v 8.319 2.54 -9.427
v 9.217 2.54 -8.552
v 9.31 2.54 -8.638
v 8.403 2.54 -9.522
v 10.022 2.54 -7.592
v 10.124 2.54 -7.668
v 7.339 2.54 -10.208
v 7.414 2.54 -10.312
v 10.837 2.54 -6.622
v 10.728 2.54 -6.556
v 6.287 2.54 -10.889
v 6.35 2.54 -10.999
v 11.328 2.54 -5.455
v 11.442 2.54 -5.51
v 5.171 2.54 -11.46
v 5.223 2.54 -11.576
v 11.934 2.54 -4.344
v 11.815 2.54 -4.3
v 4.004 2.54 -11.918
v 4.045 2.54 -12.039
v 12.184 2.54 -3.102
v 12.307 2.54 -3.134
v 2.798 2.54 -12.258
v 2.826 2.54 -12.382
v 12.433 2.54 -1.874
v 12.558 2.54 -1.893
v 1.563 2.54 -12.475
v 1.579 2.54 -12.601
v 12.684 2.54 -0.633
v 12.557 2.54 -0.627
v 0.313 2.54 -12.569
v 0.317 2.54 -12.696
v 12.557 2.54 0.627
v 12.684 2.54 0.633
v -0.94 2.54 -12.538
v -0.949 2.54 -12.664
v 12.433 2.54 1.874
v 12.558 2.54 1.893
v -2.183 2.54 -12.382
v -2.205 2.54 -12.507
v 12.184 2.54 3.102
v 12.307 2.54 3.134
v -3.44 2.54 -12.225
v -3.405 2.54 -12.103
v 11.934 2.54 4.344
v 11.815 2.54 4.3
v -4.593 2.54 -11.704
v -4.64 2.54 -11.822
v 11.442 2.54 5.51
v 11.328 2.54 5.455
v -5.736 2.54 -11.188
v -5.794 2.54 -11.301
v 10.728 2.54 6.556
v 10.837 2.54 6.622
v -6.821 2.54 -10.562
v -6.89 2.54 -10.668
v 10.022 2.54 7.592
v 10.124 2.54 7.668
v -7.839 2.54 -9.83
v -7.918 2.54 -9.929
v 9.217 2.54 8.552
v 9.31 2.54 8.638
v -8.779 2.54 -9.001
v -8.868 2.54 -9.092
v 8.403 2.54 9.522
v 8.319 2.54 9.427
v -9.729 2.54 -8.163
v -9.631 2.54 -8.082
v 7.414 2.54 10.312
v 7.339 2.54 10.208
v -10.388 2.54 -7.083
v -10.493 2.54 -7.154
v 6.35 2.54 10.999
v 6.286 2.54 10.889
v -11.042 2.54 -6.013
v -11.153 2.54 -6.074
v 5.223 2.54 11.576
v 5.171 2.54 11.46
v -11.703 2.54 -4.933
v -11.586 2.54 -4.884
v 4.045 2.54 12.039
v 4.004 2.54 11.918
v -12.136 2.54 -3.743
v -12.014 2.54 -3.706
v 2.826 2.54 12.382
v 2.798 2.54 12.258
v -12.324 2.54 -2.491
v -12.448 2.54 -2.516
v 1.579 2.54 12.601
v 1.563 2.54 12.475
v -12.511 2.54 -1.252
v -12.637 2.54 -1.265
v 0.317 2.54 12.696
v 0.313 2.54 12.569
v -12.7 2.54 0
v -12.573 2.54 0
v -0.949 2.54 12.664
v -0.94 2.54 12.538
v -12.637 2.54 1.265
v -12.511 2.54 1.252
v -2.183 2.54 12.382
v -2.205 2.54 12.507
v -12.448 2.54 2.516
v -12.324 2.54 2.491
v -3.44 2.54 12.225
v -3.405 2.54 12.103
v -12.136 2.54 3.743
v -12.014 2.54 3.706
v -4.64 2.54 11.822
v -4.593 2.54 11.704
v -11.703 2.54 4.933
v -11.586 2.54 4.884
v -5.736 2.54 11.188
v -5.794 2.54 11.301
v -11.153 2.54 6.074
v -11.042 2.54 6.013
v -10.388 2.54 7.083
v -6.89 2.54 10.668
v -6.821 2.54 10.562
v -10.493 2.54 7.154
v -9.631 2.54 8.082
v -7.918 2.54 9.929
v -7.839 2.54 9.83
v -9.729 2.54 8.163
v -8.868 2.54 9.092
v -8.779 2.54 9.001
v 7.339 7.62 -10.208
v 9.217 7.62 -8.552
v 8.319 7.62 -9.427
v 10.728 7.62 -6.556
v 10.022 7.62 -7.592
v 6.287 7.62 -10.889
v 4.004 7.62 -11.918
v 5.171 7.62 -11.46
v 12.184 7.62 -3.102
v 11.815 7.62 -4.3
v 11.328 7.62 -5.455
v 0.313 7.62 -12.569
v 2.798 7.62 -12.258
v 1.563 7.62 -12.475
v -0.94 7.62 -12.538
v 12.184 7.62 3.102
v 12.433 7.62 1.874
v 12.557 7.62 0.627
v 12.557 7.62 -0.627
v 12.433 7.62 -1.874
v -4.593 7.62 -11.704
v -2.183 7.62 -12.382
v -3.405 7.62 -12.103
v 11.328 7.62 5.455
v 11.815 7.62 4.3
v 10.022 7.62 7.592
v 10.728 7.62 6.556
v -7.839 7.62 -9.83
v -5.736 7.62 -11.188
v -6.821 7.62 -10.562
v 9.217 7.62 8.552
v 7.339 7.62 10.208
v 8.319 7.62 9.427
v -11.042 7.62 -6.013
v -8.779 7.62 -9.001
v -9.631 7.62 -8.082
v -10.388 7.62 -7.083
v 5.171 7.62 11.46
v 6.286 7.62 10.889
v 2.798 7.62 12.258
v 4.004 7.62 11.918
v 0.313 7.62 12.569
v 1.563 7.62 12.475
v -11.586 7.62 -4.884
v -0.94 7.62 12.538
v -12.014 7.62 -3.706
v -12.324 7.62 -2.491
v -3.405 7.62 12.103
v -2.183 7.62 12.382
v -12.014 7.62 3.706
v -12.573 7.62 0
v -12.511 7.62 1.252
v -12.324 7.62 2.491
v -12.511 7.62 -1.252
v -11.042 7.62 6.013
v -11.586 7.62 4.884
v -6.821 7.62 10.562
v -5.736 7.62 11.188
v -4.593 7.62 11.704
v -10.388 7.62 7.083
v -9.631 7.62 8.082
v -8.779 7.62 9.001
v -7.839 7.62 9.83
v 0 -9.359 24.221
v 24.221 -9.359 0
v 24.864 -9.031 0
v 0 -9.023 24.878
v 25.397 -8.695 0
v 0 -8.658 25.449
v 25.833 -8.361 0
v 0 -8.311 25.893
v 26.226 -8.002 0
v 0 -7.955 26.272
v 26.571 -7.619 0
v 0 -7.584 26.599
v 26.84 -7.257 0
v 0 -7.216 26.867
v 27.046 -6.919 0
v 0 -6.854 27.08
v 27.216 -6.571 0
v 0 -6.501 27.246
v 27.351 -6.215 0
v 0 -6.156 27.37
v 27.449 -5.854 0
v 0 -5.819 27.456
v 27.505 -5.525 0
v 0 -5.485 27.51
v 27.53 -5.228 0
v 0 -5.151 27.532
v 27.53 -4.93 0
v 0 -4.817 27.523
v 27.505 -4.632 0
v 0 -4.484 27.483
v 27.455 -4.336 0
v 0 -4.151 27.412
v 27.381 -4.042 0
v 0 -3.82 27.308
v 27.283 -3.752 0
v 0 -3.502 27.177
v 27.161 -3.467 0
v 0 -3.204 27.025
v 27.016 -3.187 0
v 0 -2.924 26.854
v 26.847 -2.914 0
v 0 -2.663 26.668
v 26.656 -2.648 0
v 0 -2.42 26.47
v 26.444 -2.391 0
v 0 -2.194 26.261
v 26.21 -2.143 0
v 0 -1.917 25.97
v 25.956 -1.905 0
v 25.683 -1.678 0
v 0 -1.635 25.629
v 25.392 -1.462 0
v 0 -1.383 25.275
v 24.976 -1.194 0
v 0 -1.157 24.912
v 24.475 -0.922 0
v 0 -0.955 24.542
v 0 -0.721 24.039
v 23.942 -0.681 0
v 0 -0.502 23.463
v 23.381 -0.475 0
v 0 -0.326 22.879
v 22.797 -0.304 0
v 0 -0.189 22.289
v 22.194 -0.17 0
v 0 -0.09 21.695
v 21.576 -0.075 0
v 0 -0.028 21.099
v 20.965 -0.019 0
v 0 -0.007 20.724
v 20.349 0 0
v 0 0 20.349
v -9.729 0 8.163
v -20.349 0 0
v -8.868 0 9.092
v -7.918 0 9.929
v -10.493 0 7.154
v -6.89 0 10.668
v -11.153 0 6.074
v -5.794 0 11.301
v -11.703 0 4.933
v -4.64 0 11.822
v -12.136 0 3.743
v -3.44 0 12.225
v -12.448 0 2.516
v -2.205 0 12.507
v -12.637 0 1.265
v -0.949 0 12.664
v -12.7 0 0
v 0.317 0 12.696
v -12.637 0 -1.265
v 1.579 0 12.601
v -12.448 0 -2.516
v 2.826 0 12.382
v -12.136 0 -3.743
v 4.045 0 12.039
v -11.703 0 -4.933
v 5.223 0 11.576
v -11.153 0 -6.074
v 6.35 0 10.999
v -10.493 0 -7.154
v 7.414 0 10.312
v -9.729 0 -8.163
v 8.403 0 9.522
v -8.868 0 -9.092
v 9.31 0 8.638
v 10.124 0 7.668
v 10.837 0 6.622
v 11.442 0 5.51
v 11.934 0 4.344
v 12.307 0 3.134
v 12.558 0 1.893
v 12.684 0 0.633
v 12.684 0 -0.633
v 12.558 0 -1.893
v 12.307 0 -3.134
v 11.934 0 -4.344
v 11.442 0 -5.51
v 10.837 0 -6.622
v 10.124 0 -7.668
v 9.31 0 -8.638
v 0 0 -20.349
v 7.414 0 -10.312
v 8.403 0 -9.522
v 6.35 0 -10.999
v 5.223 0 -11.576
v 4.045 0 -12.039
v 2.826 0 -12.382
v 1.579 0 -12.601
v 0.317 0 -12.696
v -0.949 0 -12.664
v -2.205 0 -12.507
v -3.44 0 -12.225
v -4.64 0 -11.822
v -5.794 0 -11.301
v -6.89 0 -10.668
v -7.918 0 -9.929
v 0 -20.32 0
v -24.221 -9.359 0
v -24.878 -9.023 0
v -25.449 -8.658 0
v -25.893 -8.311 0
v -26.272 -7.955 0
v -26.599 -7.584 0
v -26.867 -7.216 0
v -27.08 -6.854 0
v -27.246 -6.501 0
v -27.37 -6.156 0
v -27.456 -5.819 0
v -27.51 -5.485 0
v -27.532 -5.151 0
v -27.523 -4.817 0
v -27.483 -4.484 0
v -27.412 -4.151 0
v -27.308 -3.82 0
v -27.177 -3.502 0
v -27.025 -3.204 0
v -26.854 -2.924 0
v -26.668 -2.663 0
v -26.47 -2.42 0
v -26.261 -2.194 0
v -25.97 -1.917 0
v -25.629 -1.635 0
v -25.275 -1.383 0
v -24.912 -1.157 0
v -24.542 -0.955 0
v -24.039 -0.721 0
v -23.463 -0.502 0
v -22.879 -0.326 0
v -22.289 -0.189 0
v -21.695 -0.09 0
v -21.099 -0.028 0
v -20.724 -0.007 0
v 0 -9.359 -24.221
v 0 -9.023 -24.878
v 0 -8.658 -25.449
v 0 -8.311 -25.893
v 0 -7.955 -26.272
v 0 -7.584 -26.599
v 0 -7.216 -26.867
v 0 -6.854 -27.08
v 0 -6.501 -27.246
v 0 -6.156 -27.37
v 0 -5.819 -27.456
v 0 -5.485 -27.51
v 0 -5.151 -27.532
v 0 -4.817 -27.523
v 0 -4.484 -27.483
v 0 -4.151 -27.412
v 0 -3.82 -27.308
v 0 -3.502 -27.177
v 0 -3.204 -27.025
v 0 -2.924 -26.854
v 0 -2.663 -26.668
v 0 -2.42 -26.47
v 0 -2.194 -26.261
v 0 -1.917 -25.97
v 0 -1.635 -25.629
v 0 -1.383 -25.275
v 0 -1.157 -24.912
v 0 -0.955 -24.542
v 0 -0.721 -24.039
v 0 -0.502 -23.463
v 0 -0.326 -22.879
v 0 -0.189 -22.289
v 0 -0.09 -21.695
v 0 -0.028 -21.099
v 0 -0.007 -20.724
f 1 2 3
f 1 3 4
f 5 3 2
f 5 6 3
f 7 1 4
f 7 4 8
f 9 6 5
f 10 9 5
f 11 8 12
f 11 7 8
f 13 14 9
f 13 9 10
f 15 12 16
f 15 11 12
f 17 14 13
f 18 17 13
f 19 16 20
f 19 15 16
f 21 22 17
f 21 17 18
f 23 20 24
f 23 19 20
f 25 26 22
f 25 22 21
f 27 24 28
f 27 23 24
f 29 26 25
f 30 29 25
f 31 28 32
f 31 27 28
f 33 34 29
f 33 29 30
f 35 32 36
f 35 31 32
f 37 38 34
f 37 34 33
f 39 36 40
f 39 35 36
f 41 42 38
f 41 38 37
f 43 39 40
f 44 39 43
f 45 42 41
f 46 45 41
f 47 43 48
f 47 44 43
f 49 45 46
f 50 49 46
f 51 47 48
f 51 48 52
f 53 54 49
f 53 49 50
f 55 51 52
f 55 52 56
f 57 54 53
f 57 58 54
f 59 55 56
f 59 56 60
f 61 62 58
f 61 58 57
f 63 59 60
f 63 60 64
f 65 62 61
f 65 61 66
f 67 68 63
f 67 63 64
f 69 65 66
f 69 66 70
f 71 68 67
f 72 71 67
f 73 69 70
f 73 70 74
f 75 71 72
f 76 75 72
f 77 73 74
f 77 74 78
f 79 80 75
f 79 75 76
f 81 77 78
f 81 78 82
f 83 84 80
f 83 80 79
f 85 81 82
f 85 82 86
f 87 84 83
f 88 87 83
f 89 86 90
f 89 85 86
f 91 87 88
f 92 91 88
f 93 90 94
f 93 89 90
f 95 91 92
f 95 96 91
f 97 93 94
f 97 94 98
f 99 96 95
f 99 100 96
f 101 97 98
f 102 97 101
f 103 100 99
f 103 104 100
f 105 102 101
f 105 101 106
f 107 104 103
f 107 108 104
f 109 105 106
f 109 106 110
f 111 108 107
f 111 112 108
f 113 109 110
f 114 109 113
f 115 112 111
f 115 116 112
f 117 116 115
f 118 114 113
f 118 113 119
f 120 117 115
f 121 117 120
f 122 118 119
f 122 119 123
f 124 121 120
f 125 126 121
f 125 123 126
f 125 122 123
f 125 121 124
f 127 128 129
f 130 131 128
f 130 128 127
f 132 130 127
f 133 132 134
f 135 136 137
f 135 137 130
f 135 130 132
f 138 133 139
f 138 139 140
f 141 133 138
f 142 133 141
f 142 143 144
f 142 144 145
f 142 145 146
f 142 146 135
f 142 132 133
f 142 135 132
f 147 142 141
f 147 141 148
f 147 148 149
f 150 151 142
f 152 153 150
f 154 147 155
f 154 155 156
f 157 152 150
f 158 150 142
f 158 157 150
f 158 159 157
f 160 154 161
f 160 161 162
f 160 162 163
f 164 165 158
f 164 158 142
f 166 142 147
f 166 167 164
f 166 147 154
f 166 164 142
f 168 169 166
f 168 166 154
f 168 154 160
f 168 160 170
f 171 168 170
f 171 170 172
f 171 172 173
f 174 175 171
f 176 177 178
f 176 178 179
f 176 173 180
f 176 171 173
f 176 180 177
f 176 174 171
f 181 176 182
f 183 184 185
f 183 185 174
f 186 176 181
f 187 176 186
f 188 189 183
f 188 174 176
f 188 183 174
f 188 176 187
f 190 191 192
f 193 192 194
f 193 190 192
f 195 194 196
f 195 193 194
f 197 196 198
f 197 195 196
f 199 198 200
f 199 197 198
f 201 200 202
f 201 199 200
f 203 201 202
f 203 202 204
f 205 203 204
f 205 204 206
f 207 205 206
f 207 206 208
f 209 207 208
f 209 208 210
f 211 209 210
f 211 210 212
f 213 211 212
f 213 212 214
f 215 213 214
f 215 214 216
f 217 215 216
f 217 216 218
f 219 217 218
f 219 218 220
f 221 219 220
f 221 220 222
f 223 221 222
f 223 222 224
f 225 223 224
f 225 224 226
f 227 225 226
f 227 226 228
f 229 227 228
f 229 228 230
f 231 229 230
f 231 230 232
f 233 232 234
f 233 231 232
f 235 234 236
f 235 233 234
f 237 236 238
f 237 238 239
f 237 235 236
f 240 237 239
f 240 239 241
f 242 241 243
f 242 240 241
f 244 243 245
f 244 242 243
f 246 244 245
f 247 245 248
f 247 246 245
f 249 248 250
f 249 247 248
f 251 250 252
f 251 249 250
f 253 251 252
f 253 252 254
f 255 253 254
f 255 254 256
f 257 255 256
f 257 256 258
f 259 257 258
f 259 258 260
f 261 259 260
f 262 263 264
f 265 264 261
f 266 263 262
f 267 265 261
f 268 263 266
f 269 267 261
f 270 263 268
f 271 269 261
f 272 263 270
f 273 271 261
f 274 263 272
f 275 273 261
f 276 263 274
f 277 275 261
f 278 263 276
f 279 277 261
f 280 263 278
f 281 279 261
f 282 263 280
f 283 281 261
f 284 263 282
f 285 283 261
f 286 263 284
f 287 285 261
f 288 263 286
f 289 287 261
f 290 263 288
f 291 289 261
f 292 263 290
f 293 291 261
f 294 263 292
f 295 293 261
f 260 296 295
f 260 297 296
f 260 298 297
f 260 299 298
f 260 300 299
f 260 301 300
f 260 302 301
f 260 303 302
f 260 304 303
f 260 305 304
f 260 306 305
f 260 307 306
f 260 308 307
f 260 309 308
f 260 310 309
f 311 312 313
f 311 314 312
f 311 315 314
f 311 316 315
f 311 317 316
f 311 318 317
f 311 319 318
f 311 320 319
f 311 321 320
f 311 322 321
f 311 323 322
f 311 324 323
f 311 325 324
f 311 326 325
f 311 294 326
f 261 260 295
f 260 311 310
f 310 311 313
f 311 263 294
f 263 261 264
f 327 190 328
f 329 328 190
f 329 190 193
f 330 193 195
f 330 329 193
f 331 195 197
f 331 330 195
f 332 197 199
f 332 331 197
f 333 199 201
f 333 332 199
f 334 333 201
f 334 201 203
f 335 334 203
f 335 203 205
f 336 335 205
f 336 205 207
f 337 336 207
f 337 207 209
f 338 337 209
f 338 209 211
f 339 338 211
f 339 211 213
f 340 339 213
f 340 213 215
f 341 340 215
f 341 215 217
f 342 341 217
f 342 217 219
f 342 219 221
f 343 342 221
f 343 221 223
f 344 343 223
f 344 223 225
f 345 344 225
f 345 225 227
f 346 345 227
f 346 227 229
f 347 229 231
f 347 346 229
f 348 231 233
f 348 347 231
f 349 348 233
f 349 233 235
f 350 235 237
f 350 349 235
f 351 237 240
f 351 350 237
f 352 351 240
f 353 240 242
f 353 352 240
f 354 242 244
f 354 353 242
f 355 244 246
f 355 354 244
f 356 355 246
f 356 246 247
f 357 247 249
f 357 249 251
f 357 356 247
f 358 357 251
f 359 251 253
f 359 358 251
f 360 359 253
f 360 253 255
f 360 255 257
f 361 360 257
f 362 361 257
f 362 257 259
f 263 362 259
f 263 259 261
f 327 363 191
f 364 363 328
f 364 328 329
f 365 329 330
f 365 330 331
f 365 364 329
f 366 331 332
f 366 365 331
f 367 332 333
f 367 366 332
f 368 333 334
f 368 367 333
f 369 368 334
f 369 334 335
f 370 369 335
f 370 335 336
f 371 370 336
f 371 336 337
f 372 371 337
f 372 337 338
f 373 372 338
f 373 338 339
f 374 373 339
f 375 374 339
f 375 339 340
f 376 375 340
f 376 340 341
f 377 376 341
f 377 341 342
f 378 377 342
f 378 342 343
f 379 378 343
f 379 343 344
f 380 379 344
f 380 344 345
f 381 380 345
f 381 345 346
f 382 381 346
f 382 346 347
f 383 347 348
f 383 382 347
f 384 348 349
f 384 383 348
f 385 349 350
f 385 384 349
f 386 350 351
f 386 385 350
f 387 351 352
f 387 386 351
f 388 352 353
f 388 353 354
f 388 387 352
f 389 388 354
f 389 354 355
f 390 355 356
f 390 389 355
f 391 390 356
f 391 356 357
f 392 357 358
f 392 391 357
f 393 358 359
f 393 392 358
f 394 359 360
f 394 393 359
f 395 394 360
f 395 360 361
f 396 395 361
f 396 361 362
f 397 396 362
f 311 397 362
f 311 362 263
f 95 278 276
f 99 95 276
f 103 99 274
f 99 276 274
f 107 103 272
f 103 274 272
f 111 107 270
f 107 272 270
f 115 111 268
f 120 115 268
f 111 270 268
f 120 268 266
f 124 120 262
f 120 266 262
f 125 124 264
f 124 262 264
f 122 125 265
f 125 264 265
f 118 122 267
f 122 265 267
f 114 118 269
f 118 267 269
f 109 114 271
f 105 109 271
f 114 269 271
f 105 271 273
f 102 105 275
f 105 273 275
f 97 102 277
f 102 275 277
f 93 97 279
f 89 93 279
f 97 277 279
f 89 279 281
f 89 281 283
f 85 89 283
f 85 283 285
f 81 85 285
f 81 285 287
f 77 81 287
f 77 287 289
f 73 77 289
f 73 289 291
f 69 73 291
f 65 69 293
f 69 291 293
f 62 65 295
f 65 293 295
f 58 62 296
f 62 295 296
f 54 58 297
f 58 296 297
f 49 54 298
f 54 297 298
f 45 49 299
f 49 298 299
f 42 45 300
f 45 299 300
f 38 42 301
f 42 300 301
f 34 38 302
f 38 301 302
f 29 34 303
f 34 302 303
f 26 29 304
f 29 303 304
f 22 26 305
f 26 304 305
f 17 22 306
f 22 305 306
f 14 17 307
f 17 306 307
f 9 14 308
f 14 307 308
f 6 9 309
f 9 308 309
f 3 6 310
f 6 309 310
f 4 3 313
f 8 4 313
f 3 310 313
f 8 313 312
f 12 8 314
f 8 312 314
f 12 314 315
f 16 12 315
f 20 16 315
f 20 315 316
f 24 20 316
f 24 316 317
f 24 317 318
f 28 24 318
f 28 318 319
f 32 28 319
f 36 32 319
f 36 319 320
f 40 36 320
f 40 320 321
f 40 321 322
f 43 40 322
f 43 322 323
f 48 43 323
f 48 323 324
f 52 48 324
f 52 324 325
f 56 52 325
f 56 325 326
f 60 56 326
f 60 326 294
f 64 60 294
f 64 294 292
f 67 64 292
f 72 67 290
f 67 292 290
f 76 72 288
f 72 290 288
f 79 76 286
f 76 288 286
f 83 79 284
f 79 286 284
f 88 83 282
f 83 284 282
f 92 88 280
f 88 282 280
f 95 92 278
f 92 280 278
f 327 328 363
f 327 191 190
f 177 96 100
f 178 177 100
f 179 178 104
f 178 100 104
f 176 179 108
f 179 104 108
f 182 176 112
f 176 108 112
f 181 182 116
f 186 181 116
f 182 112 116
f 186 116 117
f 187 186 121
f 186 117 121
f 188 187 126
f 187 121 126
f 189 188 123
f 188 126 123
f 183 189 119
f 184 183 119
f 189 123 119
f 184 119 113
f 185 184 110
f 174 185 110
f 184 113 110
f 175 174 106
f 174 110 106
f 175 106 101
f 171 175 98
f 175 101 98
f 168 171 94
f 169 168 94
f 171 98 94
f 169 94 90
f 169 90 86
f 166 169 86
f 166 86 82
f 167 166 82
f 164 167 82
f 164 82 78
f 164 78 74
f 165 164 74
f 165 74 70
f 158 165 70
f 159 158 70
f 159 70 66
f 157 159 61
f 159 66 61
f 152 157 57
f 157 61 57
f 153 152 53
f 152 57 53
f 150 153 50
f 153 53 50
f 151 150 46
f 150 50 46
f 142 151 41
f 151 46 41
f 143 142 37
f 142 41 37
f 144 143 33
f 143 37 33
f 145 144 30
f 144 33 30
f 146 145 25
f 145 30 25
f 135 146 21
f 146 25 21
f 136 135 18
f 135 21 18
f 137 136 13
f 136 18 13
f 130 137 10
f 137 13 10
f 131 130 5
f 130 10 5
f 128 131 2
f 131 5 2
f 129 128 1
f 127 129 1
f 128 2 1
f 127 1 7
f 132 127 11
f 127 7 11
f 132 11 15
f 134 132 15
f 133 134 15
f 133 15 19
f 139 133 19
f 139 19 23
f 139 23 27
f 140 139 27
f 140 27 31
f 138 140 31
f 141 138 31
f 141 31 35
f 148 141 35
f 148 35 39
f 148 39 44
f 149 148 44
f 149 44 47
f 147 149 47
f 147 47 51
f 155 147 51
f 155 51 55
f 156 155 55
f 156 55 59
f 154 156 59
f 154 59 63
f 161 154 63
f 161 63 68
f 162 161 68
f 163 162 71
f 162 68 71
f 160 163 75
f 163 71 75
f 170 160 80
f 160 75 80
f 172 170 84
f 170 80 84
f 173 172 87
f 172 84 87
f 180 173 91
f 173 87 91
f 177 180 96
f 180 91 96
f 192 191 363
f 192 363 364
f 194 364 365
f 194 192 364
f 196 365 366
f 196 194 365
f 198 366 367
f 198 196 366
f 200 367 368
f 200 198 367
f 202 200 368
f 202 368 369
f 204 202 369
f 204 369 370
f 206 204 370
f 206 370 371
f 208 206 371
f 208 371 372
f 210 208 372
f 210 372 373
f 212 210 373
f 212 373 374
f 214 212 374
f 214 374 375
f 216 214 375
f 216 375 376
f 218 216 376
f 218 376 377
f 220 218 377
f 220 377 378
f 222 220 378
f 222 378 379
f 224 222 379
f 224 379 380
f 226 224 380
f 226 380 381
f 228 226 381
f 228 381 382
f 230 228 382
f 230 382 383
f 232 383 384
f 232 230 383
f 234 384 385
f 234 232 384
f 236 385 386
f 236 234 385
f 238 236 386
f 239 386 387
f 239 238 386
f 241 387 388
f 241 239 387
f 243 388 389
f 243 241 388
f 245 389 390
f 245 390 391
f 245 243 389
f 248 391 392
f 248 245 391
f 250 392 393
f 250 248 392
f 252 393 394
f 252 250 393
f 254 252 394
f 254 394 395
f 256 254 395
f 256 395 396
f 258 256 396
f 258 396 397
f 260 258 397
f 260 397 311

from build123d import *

# Parameters (mm, degrees)
F3_R     = 5.08
F4_R     = 12.7
F5_DEPTH = 2.54
F6_R     = 12.573
F7_DEPTH = 5.08


with BuildPart() as f2:
    # F0 (on Front) → F2 section 0
    with BuildSketch(Plane.XZ, mode=Mode.PRIVATE) as f2_s0:
        Polygon((-44.901281, 0), (0, -44.901281), (44.901281, 0), (0, 44.901281), align=None)
    loft([f2_s0.sketch, Vertex(0, -20.32, 0)])

    # F3
    f3_edges = [f2.edges().sort_by_distance(p)[0] for p in [
        (22.45064, 0, 22.45064),
        (-22.45064, 0, 22.45064),
        (-22.45064, 0, -22.45064),
        (22.45064, 0, -22.45064),
    ]]
    fillet(f3_edges, radius=F3_R)

    # F4 (on face) → F5 (join)
    with BuildSketch(Plane(origin=(0, 0, 0), x_dir=(-1, 0, 0), z_dir=(0, 1, 0))):
        Circle(F4_R)
    extrude(amount=F5_DEPTH)

    # F6 (on face) → F7 (join)
    with BuildSketch(Plane(origin=(0, 2.54, 0), x_dir=(-1, 0, 0), z_dir=(0, 1, 0))):
        Circle(F6_R)
    extrude(amount=F7_DEPTH)


solid = f2.part
